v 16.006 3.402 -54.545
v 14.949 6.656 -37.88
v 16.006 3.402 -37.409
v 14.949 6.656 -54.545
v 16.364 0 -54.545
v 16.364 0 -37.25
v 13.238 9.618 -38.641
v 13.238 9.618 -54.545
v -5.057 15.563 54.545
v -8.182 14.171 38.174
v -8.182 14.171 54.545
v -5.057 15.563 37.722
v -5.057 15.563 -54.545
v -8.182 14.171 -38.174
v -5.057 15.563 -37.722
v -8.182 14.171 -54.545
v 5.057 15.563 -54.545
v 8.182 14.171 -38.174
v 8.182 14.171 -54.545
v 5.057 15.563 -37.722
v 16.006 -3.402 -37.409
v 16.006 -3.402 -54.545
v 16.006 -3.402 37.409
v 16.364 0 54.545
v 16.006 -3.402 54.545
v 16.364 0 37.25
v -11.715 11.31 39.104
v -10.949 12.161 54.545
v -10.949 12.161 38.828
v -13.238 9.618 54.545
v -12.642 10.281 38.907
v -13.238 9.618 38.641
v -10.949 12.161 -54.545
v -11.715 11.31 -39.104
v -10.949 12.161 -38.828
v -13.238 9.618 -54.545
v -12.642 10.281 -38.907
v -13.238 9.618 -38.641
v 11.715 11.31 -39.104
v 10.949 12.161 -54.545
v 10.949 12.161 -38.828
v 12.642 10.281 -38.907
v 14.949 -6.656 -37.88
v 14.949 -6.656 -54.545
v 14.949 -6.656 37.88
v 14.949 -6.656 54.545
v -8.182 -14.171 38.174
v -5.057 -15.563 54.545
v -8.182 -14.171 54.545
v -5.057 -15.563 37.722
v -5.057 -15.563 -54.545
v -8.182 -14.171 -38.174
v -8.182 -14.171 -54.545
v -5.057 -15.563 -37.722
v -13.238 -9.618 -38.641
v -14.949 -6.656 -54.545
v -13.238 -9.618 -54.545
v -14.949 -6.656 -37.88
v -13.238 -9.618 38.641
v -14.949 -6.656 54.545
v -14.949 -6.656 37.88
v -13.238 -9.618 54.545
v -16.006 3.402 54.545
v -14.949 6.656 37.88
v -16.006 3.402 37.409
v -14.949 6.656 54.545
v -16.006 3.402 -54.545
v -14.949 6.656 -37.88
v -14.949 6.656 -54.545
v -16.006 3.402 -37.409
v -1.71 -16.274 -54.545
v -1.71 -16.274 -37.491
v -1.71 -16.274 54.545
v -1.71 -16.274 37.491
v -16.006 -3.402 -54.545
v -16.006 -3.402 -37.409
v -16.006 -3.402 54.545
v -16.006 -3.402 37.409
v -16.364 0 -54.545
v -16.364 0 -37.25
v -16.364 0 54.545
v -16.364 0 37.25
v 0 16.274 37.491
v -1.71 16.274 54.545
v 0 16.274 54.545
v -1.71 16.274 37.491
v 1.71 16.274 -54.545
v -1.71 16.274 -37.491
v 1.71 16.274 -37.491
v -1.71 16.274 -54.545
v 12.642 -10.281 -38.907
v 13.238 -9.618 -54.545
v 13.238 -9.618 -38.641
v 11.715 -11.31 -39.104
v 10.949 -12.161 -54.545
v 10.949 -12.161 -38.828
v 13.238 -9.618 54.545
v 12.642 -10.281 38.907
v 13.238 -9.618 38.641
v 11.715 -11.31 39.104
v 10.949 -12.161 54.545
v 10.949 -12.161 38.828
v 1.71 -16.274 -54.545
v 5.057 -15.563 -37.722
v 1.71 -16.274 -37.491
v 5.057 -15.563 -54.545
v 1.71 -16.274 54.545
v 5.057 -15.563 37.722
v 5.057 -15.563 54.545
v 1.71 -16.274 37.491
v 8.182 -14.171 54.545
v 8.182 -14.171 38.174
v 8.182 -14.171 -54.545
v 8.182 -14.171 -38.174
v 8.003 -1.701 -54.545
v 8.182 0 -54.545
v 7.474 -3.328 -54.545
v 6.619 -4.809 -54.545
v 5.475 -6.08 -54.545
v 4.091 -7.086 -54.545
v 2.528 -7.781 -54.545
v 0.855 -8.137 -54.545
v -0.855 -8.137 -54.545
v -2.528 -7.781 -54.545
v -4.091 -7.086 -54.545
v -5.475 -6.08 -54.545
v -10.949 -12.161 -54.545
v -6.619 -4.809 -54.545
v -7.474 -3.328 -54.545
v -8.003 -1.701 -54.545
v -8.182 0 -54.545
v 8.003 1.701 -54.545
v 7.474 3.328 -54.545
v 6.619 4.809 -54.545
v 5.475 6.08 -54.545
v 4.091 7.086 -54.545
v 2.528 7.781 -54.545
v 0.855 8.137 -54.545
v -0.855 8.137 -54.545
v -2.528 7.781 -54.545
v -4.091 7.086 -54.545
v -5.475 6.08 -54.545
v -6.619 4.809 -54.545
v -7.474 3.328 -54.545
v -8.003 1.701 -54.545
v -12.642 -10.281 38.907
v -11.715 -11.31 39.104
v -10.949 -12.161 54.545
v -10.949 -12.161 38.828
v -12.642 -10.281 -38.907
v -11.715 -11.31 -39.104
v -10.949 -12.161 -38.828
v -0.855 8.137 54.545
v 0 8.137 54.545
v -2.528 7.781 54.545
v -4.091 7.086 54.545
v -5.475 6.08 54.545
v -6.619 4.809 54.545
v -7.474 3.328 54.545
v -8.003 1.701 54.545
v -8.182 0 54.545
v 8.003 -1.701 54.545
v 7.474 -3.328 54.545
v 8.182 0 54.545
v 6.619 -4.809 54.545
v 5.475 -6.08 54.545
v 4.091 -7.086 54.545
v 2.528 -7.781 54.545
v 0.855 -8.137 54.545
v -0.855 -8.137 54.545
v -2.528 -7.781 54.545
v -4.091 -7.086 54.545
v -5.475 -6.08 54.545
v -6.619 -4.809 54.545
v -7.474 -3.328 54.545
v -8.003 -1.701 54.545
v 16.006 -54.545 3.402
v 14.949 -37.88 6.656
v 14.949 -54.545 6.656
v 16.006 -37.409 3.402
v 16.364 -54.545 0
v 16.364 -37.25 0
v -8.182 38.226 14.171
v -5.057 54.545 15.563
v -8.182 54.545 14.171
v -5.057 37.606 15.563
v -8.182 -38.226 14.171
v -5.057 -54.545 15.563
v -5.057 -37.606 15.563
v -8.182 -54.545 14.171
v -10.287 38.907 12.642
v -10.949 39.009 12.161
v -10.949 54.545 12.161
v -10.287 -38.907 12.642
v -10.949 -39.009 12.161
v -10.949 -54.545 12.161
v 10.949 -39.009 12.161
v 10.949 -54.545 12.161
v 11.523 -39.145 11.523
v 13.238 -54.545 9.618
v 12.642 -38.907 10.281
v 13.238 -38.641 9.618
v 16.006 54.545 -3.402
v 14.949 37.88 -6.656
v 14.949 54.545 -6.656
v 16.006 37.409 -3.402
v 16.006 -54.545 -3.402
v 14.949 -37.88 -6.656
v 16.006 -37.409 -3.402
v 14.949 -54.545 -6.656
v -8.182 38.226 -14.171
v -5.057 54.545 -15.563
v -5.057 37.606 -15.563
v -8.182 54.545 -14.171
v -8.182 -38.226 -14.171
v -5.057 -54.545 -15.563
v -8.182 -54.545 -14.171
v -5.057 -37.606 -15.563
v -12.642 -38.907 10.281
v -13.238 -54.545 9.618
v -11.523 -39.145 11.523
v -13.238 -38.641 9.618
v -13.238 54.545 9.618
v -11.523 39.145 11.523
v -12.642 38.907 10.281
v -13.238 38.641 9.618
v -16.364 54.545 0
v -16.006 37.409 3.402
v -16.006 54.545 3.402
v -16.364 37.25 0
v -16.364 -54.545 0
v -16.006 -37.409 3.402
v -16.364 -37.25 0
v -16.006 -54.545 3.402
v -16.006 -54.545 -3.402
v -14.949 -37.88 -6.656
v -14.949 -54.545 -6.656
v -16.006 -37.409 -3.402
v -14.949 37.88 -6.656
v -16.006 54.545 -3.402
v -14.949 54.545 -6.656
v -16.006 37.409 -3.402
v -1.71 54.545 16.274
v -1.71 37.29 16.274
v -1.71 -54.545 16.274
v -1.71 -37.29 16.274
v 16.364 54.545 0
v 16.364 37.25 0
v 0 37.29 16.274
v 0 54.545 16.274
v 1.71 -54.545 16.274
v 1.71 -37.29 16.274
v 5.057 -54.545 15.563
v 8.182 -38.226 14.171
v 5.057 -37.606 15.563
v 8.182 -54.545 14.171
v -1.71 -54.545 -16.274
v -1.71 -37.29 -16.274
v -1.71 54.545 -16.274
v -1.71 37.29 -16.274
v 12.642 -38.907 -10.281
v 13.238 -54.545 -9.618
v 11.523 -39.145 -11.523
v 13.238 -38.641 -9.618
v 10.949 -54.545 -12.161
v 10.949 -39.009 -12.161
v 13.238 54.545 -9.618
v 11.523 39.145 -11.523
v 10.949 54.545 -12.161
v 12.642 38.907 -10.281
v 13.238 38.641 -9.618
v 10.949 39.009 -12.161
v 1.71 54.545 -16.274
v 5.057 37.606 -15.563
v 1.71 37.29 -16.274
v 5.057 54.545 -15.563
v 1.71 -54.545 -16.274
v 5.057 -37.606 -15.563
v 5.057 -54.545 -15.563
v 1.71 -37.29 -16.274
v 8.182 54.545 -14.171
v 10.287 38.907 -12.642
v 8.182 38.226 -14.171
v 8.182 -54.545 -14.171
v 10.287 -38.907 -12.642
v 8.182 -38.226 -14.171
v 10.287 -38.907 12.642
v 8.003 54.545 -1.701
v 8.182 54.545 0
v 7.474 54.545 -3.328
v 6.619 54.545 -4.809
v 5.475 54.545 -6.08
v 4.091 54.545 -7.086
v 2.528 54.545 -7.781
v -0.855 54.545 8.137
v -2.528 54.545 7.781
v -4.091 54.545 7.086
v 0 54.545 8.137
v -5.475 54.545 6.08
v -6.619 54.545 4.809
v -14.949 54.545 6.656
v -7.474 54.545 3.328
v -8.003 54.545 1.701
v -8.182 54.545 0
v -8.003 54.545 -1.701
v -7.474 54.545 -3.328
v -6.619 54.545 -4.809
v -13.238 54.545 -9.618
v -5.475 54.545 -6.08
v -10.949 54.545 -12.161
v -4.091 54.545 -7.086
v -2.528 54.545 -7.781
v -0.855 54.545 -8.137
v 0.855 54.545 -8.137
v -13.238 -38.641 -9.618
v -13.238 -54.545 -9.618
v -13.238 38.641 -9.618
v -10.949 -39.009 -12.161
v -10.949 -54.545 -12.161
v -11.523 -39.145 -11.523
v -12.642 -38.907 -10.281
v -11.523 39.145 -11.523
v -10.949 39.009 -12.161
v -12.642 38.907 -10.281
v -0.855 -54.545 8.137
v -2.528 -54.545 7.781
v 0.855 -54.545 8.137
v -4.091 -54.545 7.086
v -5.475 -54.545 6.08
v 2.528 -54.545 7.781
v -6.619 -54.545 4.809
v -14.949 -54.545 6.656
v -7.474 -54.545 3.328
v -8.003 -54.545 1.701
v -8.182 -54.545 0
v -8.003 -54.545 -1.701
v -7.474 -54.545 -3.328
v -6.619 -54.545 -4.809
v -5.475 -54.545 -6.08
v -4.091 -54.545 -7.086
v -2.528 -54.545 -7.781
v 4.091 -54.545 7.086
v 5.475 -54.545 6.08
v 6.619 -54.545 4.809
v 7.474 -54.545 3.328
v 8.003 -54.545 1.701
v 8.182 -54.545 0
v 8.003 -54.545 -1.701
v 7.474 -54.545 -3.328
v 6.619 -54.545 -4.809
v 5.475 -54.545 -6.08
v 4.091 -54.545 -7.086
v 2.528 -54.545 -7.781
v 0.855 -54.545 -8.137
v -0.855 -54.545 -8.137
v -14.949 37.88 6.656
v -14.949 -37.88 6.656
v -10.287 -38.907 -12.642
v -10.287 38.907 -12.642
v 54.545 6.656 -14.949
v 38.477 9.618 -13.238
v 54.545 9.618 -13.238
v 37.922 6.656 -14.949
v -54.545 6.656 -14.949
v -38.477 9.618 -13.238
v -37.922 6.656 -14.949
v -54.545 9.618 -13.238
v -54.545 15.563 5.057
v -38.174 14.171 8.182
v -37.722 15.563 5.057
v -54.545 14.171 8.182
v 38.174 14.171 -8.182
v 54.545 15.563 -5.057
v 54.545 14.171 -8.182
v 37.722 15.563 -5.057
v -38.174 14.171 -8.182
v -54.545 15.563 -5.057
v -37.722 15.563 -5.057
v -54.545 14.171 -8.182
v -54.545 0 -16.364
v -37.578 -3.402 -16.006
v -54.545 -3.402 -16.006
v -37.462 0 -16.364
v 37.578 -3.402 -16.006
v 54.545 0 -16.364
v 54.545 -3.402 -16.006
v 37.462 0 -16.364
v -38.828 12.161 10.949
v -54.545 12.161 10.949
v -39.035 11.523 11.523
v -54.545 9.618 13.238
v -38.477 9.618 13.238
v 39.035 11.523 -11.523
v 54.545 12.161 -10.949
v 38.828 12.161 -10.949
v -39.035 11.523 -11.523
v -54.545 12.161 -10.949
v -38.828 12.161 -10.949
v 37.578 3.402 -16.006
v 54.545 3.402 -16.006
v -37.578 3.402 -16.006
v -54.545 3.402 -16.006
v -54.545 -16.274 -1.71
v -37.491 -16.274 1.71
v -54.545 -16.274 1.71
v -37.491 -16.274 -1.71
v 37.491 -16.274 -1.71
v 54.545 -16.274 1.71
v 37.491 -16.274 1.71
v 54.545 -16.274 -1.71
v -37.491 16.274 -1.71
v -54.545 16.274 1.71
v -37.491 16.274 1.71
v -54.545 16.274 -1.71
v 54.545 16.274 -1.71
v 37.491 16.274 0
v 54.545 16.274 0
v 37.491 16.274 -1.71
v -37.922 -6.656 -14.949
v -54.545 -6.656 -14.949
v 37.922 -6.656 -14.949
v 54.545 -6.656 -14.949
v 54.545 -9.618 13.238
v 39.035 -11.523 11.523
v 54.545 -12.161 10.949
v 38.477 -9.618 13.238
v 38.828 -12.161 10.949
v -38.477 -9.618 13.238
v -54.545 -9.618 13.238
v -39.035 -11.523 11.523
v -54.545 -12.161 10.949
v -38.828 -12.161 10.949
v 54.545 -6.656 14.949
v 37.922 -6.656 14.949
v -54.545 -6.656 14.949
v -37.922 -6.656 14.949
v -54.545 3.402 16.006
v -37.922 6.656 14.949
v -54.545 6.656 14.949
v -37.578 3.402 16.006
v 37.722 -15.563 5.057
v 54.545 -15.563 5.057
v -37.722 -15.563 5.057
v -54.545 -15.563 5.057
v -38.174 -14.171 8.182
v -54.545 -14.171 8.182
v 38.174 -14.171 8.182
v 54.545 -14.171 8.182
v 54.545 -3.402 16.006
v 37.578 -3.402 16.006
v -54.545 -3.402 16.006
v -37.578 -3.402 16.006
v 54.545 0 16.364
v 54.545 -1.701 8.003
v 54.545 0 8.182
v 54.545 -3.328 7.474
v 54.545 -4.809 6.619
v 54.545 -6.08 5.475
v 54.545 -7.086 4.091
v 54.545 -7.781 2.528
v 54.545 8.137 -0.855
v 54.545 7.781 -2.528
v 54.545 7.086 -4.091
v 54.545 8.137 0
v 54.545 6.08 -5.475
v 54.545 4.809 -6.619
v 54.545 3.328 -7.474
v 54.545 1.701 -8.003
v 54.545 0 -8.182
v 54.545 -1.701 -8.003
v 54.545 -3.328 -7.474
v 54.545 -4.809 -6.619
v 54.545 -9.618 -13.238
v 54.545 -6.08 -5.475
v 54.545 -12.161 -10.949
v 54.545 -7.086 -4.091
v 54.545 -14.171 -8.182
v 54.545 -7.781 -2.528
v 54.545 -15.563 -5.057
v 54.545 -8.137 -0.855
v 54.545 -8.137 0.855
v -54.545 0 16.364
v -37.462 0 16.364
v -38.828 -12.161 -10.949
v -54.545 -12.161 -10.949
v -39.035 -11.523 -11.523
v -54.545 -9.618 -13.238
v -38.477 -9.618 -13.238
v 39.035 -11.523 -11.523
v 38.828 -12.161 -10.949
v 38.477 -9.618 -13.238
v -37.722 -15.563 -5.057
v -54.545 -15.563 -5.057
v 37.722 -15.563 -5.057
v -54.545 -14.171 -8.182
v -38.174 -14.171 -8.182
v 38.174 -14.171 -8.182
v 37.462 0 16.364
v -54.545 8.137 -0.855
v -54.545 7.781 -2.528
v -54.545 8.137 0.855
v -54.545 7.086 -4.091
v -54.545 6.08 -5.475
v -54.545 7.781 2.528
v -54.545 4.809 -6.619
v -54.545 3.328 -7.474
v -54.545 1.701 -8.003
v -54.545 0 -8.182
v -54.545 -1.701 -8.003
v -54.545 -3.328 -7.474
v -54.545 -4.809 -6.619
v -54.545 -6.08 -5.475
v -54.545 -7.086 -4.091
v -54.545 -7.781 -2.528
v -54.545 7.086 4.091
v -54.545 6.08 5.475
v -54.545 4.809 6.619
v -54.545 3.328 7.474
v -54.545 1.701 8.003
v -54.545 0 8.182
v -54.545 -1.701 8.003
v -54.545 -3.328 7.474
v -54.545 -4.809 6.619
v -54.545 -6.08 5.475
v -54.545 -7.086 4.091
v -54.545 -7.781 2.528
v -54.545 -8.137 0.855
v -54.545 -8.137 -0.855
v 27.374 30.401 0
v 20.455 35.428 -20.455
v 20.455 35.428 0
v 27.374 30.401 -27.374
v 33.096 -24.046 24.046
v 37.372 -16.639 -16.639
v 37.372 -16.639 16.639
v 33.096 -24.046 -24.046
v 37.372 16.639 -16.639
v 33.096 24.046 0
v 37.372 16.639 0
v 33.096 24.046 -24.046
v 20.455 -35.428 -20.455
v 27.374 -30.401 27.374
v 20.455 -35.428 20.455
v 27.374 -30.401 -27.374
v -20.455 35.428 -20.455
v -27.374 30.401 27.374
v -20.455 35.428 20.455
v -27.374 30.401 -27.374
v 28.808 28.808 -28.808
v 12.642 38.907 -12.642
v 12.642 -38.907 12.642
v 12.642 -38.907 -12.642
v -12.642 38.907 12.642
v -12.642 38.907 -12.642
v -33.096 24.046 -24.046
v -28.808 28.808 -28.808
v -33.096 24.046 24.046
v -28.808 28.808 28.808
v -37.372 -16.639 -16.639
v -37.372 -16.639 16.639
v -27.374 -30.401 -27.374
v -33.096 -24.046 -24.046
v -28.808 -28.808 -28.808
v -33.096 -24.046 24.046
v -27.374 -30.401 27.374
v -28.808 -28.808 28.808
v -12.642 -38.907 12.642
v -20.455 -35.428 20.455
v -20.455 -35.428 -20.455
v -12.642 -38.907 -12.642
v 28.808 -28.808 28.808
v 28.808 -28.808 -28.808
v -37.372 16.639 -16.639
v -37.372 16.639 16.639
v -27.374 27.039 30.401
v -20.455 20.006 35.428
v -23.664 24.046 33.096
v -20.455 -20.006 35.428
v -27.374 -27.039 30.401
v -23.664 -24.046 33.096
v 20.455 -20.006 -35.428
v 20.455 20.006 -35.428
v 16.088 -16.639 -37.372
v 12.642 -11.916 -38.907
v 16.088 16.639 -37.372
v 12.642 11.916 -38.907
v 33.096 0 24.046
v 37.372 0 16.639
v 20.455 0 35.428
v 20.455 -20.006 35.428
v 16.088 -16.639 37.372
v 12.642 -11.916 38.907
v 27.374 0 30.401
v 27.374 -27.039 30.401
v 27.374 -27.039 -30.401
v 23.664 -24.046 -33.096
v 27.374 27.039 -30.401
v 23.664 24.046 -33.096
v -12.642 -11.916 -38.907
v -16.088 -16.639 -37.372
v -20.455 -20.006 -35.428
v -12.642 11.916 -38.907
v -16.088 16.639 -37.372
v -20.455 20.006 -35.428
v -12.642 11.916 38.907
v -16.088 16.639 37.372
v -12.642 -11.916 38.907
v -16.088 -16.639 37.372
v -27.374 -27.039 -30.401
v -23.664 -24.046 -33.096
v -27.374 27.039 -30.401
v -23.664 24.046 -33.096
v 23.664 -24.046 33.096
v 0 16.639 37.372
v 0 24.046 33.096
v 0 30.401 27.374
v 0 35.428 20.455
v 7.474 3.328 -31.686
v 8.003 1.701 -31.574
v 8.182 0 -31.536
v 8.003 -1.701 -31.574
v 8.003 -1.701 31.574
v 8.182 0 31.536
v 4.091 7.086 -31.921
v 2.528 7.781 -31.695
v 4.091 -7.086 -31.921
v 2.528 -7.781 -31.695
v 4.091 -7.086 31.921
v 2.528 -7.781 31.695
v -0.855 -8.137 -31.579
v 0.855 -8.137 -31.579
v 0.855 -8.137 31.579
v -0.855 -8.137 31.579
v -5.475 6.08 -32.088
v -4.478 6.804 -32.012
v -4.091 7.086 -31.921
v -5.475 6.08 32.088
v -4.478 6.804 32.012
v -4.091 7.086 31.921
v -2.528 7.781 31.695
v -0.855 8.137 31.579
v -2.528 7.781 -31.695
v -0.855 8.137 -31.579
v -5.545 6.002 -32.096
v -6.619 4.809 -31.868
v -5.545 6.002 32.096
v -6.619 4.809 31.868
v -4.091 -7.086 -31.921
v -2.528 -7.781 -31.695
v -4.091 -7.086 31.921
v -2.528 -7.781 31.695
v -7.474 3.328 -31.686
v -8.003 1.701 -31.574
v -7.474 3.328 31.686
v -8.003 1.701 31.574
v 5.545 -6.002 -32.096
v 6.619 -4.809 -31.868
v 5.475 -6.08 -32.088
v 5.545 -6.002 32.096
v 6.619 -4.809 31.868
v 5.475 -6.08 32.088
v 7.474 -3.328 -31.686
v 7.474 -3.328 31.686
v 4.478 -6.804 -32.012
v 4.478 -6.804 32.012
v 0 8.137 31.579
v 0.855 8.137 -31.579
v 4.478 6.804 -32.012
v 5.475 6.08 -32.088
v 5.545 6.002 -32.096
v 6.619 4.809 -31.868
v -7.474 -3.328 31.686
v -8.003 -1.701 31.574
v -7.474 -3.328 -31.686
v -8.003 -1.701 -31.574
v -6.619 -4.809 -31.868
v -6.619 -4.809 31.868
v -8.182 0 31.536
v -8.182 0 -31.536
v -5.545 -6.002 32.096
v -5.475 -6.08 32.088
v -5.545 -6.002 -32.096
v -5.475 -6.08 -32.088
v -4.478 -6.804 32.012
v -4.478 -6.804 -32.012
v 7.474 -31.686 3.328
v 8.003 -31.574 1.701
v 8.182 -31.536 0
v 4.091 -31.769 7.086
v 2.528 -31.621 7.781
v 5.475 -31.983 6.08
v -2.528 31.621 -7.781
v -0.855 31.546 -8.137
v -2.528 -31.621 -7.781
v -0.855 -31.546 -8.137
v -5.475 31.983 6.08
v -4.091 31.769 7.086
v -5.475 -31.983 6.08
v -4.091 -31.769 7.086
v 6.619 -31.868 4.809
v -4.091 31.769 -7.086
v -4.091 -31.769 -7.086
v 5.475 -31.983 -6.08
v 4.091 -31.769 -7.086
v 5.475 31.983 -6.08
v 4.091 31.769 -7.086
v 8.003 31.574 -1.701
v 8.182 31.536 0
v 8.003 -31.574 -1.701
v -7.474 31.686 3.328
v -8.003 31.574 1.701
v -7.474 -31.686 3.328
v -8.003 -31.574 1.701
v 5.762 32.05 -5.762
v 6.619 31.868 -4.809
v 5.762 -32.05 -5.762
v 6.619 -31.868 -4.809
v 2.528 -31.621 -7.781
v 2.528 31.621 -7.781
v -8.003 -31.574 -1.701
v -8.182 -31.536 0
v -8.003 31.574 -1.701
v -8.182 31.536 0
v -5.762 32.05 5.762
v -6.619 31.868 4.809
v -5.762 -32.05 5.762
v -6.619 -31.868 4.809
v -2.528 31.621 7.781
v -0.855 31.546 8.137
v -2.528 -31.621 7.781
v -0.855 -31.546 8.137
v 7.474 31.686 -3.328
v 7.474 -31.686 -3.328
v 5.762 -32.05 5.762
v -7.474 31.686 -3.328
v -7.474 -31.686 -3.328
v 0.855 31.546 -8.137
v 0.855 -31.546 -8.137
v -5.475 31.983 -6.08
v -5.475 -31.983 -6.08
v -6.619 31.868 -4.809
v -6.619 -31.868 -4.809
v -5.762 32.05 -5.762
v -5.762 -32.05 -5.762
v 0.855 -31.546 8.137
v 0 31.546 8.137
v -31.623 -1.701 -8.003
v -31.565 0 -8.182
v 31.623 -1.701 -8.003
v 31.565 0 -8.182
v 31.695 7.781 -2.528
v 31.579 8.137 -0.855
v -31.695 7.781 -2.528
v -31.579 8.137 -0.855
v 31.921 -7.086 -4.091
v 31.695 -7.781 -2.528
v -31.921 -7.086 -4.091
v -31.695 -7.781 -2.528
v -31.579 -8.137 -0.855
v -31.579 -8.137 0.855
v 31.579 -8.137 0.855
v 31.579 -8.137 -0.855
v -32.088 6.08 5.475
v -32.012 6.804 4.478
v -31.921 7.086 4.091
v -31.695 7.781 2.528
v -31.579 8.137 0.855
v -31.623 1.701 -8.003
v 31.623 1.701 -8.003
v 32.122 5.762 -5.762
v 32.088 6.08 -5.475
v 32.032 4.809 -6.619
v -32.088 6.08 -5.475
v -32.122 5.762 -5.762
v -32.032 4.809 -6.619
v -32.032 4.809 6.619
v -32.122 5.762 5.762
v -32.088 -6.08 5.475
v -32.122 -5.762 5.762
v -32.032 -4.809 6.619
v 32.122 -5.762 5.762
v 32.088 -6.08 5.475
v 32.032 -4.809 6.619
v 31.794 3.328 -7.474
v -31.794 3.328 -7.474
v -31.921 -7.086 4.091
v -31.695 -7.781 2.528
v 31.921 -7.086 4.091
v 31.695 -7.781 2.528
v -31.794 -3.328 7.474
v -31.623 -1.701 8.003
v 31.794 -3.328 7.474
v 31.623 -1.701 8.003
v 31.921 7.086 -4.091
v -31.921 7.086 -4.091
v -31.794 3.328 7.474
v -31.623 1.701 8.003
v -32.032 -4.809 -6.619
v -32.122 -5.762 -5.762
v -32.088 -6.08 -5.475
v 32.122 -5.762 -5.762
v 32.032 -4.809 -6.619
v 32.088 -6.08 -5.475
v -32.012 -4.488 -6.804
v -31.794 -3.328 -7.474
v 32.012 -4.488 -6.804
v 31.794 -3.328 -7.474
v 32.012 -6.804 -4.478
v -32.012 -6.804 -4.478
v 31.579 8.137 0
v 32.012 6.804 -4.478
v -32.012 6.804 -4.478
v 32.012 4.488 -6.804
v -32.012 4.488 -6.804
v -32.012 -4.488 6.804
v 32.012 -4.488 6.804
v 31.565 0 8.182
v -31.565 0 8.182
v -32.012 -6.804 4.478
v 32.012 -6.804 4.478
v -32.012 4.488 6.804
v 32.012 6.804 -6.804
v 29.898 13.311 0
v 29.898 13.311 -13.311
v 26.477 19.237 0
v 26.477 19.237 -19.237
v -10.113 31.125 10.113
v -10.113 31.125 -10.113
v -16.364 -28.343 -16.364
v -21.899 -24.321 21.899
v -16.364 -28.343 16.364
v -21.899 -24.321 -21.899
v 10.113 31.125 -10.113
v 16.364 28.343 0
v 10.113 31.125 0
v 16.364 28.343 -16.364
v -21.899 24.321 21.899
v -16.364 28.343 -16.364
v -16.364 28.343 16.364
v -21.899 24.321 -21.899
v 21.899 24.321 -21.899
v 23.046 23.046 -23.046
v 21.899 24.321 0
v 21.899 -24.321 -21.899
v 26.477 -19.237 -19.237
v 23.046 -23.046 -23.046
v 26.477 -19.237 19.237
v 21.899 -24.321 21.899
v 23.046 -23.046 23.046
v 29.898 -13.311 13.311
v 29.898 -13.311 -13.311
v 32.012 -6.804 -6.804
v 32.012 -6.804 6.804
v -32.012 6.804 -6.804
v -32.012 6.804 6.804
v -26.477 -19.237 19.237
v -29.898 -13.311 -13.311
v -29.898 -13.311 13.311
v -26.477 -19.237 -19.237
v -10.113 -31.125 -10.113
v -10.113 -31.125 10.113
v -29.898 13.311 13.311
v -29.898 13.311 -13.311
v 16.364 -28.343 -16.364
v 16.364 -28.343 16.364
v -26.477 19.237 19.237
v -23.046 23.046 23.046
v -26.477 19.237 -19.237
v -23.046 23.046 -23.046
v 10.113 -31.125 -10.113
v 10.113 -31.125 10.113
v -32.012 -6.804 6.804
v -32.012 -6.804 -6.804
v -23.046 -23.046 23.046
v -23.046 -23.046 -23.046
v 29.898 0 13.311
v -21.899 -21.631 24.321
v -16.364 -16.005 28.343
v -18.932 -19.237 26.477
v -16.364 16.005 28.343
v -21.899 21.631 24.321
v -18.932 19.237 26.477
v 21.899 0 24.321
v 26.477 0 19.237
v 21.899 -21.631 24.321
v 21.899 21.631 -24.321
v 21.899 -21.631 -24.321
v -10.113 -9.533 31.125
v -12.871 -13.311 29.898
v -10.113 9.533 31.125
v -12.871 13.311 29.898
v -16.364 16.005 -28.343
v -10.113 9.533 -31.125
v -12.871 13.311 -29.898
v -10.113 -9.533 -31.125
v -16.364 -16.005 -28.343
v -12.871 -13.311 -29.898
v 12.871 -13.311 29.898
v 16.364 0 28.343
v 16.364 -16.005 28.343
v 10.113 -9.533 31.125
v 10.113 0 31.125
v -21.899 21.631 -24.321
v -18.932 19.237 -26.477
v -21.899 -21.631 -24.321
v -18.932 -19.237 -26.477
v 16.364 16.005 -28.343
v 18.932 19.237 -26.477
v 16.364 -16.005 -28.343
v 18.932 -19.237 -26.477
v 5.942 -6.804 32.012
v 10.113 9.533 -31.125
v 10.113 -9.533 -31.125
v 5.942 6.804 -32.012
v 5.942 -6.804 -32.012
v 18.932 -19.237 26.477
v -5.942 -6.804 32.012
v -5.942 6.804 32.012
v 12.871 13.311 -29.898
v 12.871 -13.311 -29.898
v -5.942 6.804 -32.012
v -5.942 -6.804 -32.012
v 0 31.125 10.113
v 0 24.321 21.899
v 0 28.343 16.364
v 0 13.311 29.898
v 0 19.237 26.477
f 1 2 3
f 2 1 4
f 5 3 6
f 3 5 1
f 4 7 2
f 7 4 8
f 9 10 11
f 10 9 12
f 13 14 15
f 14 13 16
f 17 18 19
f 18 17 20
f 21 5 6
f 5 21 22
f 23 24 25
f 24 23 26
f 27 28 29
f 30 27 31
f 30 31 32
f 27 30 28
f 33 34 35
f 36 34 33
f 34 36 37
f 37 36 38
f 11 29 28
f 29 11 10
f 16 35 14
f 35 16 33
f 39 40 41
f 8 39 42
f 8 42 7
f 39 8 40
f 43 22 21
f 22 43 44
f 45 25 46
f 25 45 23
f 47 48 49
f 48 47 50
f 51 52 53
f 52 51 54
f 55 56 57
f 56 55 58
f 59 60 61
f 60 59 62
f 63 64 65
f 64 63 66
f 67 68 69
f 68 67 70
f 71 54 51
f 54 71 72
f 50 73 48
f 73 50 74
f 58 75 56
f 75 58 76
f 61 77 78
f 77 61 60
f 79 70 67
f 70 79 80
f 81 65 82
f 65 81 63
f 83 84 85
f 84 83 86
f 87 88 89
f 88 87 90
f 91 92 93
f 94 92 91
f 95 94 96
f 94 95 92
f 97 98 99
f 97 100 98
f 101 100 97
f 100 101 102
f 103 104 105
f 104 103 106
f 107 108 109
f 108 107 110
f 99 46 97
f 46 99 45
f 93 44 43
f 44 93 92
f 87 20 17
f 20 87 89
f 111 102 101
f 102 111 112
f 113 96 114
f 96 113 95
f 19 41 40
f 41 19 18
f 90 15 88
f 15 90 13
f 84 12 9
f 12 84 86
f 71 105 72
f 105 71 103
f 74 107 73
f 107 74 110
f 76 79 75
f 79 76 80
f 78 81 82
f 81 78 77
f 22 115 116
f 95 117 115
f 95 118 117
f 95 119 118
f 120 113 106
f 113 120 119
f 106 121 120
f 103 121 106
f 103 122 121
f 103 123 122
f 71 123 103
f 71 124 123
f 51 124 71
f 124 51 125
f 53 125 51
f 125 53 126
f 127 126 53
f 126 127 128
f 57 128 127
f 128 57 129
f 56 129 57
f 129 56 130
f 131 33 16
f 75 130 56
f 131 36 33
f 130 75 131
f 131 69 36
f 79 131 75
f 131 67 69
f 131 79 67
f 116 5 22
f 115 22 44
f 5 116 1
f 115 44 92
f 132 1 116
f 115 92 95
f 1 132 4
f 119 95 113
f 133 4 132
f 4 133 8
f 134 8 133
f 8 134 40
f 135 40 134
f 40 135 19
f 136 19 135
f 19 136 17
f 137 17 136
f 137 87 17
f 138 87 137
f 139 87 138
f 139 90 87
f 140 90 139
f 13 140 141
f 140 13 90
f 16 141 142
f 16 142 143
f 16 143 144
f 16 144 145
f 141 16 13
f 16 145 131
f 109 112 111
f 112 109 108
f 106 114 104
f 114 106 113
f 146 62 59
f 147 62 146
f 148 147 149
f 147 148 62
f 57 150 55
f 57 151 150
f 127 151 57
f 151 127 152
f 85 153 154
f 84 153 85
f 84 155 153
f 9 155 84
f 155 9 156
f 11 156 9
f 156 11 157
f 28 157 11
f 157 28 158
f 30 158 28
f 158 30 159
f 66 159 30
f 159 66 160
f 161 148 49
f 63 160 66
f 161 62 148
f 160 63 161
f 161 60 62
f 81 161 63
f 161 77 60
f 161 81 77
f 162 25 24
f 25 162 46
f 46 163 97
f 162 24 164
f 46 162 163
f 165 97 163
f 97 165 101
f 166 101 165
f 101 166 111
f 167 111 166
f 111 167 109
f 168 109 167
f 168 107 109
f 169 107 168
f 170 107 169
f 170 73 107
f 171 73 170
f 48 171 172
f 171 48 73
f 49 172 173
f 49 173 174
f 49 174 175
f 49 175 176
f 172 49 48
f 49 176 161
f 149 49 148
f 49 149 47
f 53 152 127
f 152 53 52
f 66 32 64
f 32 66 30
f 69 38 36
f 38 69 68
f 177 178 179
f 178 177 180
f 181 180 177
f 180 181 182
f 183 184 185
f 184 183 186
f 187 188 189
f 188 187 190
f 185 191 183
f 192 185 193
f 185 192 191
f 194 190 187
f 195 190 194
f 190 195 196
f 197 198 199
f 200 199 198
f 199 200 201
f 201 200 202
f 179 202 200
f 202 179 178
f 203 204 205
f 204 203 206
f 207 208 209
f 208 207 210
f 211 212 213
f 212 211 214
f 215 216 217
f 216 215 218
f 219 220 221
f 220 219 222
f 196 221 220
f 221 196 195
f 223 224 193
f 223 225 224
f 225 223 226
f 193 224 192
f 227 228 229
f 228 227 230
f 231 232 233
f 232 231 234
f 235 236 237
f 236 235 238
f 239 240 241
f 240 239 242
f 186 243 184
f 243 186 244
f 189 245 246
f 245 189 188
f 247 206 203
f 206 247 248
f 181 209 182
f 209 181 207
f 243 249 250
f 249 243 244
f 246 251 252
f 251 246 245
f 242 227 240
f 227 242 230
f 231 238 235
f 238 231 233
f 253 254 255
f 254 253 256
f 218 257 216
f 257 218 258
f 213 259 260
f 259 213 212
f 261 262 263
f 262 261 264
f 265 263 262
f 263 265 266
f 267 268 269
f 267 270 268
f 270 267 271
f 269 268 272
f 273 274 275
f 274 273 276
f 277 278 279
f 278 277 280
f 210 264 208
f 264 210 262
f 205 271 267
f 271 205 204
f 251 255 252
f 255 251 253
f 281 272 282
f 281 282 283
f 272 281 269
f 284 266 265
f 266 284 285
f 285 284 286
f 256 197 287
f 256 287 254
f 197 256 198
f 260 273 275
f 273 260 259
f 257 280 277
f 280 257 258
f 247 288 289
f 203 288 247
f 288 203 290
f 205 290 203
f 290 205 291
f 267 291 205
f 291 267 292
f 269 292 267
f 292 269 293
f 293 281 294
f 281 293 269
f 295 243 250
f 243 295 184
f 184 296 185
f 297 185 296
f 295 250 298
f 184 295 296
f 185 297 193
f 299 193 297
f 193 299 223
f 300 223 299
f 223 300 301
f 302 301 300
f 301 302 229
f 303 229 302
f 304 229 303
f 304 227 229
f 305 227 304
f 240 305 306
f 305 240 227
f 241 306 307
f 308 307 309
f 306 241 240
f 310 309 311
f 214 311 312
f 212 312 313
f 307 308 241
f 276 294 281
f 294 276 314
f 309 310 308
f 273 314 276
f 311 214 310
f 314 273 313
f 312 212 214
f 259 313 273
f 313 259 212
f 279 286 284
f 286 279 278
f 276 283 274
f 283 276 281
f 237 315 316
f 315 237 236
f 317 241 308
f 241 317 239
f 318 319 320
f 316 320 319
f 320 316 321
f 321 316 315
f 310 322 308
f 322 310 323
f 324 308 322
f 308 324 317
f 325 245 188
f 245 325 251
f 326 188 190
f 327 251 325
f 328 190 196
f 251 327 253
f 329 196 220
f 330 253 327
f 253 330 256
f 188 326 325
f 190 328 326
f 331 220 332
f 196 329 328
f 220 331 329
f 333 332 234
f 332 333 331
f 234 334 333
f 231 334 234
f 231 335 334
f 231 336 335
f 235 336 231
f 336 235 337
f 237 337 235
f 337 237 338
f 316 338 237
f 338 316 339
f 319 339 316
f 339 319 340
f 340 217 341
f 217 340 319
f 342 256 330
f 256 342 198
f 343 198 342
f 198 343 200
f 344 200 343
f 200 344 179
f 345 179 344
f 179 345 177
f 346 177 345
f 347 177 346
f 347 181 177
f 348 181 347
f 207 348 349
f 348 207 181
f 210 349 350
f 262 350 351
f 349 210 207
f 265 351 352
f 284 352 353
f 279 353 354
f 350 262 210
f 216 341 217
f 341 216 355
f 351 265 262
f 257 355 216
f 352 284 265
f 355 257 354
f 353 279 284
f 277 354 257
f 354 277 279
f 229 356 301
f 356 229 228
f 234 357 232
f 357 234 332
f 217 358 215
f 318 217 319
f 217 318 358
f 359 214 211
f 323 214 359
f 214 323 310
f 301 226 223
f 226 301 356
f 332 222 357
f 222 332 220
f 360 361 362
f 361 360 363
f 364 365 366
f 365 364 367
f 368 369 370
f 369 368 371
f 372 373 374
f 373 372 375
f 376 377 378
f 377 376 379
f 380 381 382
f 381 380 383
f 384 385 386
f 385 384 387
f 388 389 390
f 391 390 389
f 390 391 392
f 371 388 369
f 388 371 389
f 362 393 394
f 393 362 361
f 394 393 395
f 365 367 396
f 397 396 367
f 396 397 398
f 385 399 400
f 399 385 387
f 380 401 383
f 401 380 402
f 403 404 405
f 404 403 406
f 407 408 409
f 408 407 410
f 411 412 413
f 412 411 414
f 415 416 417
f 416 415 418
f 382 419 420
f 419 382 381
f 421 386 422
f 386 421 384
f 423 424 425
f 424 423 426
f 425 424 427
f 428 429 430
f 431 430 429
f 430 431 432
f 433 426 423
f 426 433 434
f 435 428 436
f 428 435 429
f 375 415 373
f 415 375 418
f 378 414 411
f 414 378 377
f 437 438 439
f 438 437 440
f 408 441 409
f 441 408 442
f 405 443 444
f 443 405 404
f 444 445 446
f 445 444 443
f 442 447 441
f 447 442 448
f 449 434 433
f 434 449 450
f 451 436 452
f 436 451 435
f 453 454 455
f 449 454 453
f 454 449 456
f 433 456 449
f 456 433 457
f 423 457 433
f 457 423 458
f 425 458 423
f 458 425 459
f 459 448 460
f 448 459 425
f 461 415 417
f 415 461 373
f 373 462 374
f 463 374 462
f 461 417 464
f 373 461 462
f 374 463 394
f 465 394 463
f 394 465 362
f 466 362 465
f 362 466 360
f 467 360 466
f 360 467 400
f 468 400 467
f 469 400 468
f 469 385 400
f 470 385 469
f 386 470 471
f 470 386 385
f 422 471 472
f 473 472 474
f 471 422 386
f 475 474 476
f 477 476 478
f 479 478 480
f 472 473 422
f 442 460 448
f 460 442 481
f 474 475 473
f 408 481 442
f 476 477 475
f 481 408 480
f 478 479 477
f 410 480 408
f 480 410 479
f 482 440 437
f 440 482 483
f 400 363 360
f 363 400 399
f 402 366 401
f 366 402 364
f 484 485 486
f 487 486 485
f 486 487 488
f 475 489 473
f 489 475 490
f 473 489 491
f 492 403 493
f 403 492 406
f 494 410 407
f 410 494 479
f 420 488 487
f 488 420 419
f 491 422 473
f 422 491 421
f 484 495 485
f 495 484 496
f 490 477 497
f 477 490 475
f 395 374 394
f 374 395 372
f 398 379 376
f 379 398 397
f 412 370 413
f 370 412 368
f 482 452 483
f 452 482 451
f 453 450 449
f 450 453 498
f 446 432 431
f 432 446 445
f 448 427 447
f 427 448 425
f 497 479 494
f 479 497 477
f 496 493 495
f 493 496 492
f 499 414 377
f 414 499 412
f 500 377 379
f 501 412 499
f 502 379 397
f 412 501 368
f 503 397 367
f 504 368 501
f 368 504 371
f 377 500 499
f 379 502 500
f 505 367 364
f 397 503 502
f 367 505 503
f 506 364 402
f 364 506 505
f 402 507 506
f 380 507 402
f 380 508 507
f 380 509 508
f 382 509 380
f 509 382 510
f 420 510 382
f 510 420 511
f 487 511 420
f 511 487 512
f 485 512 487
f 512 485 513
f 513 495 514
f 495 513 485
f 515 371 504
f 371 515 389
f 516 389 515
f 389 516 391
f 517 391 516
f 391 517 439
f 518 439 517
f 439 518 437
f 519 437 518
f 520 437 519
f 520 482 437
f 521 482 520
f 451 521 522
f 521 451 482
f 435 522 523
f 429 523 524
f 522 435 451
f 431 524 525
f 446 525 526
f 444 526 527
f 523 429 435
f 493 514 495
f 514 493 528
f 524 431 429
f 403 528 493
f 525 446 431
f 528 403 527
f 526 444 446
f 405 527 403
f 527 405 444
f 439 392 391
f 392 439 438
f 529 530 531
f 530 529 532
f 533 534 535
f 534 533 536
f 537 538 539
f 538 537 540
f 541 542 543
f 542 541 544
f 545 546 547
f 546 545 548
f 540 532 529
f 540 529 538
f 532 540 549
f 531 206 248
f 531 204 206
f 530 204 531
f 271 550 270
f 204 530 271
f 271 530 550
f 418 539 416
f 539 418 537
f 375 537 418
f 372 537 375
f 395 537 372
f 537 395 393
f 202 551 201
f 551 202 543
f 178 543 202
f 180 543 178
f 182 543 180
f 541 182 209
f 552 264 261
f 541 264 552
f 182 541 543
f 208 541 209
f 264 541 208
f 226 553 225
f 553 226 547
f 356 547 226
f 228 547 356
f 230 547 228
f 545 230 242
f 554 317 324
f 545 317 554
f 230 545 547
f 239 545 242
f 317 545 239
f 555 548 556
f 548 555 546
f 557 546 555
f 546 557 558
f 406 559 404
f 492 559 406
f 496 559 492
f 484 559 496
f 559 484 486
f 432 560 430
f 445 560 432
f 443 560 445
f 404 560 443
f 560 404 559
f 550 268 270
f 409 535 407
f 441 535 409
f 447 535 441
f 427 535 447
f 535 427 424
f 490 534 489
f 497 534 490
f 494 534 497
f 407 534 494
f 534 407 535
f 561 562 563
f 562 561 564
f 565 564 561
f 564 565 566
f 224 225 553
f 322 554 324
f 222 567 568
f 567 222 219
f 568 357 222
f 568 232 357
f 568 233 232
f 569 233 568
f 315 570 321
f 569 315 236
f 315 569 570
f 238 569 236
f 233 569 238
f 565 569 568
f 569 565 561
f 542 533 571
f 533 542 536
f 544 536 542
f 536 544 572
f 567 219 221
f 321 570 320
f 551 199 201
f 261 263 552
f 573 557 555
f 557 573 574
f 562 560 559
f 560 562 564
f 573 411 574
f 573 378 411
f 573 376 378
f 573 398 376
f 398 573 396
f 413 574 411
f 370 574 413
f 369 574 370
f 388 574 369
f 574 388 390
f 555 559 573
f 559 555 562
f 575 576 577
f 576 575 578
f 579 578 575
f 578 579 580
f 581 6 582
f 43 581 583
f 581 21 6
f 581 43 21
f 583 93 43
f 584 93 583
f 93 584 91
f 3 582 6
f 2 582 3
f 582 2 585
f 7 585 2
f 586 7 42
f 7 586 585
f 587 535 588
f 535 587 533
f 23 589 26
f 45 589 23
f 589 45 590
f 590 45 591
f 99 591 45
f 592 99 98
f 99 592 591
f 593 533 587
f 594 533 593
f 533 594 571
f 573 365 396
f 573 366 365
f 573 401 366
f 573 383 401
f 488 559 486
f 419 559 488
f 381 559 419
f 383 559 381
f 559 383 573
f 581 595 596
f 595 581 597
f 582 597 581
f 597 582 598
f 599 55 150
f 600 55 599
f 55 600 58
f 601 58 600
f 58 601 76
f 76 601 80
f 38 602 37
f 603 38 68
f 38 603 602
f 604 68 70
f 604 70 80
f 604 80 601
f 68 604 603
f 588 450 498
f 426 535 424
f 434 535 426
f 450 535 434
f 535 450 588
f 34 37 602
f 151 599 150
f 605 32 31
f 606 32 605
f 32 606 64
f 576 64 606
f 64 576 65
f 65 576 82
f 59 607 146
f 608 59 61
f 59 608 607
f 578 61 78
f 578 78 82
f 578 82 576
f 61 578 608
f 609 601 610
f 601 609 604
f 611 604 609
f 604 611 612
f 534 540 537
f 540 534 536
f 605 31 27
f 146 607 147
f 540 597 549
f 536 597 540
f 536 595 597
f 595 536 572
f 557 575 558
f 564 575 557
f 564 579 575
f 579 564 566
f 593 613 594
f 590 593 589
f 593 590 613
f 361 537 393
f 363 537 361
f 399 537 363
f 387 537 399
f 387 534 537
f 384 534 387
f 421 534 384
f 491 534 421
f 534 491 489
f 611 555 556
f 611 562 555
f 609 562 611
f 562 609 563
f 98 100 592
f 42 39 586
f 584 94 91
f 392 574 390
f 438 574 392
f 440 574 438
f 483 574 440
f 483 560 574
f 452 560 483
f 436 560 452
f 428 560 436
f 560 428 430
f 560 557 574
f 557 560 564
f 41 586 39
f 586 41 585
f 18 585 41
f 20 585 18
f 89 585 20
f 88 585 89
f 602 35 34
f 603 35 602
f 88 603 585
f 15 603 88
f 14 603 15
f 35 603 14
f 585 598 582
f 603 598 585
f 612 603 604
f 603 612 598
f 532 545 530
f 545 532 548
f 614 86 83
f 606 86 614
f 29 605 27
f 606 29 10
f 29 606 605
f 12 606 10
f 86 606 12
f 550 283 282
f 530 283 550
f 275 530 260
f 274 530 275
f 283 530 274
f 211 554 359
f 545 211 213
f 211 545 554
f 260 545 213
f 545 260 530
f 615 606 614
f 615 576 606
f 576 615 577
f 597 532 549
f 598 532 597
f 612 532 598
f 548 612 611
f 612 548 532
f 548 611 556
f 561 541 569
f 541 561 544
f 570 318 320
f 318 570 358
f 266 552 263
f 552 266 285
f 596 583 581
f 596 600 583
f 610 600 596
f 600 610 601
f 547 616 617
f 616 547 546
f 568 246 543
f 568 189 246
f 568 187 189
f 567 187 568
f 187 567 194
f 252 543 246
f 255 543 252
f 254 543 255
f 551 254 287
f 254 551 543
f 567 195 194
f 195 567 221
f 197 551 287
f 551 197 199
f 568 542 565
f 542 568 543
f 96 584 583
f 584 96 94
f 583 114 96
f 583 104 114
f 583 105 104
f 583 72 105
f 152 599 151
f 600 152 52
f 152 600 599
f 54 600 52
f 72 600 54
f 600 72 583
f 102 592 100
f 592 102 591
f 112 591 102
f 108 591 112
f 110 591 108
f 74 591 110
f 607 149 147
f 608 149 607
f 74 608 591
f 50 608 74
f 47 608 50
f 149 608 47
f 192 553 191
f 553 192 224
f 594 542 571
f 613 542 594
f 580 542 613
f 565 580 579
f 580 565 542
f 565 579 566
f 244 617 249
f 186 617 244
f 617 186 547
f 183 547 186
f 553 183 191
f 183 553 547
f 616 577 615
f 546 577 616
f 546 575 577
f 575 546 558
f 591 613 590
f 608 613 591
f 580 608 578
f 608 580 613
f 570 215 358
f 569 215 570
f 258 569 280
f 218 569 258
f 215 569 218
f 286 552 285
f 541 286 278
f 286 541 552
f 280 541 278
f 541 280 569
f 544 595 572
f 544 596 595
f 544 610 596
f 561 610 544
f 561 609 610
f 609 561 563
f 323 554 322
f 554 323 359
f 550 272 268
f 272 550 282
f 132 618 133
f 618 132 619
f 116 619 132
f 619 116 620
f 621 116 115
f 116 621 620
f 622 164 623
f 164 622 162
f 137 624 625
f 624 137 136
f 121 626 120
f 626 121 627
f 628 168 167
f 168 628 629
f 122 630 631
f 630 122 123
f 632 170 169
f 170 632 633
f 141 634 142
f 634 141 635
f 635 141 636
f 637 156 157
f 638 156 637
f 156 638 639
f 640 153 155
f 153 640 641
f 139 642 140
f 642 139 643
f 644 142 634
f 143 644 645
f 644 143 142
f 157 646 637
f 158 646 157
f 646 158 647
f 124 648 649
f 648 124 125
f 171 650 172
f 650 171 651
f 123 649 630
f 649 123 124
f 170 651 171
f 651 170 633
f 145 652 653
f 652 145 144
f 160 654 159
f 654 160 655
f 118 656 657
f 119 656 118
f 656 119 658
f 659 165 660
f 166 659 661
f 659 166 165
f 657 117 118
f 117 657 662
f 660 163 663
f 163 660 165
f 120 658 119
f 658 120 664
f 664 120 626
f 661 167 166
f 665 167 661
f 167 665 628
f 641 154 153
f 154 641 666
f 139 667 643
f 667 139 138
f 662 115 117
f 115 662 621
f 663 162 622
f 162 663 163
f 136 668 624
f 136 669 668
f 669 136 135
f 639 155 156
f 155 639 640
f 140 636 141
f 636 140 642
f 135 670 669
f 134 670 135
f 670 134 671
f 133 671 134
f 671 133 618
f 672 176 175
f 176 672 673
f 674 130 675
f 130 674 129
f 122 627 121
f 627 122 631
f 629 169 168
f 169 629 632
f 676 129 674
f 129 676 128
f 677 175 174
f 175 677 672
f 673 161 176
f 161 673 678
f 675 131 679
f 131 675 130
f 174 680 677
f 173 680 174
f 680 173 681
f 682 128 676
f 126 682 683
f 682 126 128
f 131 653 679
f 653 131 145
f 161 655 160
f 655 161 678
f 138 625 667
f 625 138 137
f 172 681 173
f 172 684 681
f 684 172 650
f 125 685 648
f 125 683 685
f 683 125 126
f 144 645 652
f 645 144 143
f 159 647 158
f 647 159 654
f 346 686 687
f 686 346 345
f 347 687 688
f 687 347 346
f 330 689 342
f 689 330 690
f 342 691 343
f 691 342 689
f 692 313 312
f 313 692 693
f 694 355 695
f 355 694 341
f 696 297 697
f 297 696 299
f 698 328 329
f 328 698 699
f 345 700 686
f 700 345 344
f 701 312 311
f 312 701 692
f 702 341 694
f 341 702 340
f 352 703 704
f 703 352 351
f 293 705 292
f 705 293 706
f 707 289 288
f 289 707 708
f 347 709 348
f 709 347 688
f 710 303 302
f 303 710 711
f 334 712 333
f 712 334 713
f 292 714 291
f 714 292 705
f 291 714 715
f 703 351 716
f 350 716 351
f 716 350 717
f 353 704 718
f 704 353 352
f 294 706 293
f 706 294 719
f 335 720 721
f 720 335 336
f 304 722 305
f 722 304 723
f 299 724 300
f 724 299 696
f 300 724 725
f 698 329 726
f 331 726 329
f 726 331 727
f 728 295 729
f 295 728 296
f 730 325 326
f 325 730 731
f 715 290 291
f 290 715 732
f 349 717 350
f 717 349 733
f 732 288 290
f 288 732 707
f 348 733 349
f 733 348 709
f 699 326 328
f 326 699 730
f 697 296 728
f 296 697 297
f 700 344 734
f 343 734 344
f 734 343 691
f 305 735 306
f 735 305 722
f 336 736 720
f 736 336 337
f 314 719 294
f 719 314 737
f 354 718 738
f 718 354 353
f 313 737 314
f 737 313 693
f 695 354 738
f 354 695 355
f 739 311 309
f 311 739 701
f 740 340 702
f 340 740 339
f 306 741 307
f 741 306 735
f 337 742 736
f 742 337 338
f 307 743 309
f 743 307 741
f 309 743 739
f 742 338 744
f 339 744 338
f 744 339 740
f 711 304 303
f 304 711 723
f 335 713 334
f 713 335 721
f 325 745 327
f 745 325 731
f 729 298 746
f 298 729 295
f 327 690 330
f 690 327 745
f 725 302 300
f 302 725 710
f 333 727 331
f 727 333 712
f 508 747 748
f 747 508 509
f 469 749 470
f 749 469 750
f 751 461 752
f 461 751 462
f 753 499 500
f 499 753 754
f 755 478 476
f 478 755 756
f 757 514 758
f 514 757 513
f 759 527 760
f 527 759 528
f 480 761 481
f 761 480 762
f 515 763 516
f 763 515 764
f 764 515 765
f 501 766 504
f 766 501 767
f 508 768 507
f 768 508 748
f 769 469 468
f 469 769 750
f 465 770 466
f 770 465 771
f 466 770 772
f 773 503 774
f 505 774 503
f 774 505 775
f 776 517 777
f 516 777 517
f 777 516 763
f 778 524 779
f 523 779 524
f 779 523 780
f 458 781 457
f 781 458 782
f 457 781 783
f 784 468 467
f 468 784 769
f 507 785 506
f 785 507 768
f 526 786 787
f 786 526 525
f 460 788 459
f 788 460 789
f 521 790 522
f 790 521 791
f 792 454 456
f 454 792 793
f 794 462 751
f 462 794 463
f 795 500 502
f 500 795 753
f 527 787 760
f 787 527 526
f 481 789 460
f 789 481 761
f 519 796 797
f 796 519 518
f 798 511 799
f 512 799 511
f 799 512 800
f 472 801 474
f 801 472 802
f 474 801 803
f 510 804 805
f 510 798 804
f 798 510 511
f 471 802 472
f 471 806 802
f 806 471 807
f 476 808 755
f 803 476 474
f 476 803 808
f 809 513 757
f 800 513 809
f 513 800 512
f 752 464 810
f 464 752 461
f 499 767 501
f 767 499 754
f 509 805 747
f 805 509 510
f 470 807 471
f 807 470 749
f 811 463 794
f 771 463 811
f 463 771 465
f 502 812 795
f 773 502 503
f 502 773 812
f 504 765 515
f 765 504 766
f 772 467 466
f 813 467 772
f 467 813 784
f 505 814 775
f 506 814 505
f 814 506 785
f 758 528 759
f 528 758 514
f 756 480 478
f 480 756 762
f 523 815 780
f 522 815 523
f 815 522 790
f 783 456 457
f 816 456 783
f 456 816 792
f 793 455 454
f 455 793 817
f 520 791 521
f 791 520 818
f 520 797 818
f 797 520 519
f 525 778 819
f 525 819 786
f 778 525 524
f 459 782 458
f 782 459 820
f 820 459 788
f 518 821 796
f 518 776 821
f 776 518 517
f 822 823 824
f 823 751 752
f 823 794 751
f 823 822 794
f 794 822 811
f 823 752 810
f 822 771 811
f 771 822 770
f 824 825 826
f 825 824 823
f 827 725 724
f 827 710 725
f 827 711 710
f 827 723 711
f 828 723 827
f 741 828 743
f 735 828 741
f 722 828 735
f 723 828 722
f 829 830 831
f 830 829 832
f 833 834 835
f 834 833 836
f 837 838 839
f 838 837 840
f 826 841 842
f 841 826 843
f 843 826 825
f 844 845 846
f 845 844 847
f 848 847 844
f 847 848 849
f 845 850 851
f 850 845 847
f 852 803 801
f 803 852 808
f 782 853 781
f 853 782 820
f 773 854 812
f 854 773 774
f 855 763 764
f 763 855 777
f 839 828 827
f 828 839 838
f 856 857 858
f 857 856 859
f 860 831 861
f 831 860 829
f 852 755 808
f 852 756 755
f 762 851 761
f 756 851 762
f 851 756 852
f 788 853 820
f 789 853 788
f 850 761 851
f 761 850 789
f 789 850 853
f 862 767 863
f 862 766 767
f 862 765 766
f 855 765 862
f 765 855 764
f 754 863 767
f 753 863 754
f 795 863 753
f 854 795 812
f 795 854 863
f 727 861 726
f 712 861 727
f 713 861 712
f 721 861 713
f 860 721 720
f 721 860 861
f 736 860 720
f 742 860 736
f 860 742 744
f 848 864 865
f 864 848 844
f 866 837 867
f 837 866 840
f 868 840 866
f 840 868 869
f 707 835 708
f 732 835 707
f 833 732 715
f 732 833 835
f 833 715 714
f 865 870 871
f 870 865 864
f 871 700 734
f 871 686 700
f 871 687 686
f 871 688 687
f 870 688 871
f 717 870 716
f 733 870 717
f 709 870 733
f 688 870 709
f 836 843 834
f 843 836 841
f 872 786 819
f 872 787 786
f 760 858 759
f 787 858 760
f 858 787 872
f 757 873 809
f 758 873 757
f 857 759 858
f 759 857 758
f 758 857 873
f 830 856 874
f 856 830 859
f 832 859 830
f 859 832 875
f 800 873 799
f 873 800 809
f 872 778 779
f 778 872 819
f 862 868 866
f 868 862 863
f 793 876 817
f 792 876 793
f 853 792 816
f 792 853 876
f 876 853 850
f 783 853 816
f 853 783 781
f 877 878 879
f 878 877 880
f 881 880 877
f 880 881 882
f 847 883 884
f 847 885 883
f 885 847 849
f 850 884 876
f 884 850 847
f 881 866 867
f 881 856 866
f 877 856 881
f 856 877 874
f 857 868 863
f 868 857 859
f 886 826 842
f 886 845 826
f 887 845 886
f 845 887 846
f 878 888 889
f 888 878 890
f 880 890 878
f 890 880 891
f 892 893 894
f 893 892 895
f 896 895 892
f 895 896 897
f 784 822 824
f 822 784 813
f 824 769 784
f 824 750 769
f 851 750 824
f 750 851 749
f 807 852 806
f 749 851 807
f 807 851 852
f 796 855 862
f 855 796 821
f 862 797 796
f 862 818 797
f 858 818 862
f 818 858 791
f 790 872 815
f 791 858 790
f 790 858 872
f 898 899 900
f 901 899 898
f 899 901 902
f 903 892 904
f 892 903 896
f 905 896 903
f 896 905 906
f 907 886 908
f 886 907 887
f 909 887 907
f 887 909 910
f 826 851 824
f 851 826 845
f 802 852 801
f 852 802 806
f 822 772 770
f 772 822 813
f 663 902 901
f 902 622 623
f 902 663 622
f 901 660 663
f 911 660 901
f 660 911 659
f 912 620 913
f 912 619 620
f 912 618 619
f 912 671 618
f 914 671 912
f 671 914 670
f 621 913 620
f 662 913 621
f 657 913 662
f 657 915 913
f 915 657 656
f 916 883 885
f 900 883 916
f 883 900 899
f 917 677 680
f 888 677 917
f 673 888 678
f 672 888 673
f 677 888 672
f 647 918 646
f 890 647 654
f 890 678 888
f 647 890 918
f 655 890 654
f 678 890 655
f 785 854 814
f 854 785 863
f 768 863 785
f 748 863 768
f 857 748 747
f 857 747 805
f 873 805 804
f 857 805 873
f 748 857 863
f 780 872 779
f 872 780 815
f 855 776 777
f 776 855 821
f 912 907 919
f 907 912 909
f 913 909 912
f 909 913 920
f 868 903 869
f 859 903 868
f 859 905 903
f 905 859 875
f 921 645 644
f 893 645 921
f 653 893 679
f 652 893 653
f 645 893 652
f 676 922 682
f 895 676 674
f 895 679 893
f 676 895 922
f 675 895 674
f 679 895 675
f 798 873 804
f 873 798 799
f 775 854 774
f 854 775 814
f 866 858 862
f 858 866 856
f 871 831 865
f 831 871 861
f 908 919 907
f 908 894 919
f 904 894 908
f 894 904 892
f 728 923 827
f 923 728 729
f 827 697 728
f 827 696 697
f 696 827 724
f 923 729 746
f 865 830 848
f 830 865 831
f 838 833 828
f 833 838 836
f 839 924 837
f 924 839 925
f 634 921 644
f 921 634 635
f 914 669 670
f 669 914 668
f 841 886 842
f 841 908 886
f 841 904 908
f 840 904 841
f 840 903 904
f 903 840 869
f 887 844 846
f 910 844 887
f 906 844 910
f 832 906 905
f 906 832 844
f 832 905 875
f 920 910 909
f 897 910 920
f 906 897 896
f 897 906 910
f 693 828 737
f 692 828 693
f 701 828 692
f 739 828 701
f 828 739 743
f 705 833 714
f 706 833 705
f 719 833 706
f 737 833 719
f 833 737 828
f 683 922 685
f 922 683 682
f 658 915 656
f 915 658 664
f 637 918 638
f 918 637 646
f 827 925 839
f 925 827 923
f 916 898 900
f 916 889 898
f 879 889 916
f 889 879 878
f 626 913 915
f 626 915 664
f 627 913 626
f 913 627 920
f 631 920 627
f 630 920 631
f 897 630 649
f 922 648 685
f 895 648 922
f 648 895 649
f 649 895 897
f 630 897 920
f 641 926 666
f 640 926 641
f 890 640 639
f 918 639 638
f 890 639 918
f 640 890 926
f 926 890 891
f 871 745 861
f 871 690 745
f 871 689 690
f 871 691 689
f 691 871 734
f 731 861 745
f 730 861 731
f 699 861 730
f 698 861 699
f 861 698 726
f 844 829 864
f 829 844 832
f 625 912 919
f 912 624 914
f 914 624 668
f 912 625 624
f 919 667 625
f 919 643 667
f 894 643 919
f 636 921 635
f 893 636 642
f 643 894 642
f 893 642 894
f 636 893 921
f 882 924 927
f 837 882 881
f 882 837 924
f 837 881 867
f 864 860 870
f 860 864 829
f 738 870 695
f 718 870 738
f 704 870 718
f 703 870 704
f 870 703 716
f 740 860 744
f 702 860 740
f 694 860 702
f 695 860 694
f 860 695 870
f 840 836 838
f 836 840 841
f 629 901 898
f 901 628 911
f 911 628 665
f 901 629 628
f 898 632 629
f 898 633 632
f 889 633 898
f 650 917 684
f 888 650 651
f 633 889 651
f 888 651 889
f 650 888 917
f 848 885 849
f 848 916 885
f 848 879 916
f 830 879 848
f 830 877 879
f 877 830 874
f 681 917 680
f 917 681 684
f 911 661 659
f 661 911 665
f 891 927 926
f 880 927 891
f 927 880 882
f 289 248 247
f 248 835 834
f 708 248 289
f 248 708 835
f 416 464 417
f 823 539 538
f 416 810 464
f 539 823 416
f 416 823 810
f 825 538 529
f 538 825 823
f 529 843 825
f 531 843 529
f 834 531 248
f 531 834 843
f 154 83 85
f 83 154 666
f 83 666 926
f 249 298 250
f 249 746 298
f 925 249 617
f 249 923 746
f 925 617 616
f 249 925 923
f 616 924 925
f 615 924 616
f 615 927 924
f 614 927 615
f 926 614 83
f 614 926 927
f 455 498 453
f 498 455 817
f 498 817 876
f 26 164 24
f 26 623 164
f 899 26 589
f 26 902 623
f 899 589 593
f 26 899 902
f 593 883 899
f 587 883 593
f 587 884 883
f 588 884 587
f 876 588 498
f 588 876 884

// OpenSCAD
$fn = 30;

scale_factor = 300/55;
core_height = 20 * scale_factor;
core_radius = 3 * scale_factor;


module cylinder_sphere(height) {
	intersection() {
		cylinder(h=height, r=height/2, center=true);
		rotate(a=90, v=[1,0,0]) cylinder(h=height, r=height/2, center=true);
		rotate(a=90, v=[0,1,0]) cylinder(h=height, r=height/2, center=true);
	}
}

module core_shape(height, radius) {
	cylinder(h=height,r=radius,center=true);
	rotate(a=90,v=[1,0,0]) cylinder(h=height,r=radius,center=true);
	rotate(a=90,v=[0,1,0]) cylinder(h=height,r=radius,center=true);
}

module core_filled_in() {
	core_shape(core_height, core_radius);
	cylinder_sphere(core_height*0.75);
}

module core_hollow_part() {
	core_shape(core_height, core_radius/2);
	cylinder_sphere(core_height*0.6);
}

module core() {
	difference() {
		core_filled_in();
		core_hollow_part();
	}
}


difference() {
	core();
	cube([150,150,150]);
}
